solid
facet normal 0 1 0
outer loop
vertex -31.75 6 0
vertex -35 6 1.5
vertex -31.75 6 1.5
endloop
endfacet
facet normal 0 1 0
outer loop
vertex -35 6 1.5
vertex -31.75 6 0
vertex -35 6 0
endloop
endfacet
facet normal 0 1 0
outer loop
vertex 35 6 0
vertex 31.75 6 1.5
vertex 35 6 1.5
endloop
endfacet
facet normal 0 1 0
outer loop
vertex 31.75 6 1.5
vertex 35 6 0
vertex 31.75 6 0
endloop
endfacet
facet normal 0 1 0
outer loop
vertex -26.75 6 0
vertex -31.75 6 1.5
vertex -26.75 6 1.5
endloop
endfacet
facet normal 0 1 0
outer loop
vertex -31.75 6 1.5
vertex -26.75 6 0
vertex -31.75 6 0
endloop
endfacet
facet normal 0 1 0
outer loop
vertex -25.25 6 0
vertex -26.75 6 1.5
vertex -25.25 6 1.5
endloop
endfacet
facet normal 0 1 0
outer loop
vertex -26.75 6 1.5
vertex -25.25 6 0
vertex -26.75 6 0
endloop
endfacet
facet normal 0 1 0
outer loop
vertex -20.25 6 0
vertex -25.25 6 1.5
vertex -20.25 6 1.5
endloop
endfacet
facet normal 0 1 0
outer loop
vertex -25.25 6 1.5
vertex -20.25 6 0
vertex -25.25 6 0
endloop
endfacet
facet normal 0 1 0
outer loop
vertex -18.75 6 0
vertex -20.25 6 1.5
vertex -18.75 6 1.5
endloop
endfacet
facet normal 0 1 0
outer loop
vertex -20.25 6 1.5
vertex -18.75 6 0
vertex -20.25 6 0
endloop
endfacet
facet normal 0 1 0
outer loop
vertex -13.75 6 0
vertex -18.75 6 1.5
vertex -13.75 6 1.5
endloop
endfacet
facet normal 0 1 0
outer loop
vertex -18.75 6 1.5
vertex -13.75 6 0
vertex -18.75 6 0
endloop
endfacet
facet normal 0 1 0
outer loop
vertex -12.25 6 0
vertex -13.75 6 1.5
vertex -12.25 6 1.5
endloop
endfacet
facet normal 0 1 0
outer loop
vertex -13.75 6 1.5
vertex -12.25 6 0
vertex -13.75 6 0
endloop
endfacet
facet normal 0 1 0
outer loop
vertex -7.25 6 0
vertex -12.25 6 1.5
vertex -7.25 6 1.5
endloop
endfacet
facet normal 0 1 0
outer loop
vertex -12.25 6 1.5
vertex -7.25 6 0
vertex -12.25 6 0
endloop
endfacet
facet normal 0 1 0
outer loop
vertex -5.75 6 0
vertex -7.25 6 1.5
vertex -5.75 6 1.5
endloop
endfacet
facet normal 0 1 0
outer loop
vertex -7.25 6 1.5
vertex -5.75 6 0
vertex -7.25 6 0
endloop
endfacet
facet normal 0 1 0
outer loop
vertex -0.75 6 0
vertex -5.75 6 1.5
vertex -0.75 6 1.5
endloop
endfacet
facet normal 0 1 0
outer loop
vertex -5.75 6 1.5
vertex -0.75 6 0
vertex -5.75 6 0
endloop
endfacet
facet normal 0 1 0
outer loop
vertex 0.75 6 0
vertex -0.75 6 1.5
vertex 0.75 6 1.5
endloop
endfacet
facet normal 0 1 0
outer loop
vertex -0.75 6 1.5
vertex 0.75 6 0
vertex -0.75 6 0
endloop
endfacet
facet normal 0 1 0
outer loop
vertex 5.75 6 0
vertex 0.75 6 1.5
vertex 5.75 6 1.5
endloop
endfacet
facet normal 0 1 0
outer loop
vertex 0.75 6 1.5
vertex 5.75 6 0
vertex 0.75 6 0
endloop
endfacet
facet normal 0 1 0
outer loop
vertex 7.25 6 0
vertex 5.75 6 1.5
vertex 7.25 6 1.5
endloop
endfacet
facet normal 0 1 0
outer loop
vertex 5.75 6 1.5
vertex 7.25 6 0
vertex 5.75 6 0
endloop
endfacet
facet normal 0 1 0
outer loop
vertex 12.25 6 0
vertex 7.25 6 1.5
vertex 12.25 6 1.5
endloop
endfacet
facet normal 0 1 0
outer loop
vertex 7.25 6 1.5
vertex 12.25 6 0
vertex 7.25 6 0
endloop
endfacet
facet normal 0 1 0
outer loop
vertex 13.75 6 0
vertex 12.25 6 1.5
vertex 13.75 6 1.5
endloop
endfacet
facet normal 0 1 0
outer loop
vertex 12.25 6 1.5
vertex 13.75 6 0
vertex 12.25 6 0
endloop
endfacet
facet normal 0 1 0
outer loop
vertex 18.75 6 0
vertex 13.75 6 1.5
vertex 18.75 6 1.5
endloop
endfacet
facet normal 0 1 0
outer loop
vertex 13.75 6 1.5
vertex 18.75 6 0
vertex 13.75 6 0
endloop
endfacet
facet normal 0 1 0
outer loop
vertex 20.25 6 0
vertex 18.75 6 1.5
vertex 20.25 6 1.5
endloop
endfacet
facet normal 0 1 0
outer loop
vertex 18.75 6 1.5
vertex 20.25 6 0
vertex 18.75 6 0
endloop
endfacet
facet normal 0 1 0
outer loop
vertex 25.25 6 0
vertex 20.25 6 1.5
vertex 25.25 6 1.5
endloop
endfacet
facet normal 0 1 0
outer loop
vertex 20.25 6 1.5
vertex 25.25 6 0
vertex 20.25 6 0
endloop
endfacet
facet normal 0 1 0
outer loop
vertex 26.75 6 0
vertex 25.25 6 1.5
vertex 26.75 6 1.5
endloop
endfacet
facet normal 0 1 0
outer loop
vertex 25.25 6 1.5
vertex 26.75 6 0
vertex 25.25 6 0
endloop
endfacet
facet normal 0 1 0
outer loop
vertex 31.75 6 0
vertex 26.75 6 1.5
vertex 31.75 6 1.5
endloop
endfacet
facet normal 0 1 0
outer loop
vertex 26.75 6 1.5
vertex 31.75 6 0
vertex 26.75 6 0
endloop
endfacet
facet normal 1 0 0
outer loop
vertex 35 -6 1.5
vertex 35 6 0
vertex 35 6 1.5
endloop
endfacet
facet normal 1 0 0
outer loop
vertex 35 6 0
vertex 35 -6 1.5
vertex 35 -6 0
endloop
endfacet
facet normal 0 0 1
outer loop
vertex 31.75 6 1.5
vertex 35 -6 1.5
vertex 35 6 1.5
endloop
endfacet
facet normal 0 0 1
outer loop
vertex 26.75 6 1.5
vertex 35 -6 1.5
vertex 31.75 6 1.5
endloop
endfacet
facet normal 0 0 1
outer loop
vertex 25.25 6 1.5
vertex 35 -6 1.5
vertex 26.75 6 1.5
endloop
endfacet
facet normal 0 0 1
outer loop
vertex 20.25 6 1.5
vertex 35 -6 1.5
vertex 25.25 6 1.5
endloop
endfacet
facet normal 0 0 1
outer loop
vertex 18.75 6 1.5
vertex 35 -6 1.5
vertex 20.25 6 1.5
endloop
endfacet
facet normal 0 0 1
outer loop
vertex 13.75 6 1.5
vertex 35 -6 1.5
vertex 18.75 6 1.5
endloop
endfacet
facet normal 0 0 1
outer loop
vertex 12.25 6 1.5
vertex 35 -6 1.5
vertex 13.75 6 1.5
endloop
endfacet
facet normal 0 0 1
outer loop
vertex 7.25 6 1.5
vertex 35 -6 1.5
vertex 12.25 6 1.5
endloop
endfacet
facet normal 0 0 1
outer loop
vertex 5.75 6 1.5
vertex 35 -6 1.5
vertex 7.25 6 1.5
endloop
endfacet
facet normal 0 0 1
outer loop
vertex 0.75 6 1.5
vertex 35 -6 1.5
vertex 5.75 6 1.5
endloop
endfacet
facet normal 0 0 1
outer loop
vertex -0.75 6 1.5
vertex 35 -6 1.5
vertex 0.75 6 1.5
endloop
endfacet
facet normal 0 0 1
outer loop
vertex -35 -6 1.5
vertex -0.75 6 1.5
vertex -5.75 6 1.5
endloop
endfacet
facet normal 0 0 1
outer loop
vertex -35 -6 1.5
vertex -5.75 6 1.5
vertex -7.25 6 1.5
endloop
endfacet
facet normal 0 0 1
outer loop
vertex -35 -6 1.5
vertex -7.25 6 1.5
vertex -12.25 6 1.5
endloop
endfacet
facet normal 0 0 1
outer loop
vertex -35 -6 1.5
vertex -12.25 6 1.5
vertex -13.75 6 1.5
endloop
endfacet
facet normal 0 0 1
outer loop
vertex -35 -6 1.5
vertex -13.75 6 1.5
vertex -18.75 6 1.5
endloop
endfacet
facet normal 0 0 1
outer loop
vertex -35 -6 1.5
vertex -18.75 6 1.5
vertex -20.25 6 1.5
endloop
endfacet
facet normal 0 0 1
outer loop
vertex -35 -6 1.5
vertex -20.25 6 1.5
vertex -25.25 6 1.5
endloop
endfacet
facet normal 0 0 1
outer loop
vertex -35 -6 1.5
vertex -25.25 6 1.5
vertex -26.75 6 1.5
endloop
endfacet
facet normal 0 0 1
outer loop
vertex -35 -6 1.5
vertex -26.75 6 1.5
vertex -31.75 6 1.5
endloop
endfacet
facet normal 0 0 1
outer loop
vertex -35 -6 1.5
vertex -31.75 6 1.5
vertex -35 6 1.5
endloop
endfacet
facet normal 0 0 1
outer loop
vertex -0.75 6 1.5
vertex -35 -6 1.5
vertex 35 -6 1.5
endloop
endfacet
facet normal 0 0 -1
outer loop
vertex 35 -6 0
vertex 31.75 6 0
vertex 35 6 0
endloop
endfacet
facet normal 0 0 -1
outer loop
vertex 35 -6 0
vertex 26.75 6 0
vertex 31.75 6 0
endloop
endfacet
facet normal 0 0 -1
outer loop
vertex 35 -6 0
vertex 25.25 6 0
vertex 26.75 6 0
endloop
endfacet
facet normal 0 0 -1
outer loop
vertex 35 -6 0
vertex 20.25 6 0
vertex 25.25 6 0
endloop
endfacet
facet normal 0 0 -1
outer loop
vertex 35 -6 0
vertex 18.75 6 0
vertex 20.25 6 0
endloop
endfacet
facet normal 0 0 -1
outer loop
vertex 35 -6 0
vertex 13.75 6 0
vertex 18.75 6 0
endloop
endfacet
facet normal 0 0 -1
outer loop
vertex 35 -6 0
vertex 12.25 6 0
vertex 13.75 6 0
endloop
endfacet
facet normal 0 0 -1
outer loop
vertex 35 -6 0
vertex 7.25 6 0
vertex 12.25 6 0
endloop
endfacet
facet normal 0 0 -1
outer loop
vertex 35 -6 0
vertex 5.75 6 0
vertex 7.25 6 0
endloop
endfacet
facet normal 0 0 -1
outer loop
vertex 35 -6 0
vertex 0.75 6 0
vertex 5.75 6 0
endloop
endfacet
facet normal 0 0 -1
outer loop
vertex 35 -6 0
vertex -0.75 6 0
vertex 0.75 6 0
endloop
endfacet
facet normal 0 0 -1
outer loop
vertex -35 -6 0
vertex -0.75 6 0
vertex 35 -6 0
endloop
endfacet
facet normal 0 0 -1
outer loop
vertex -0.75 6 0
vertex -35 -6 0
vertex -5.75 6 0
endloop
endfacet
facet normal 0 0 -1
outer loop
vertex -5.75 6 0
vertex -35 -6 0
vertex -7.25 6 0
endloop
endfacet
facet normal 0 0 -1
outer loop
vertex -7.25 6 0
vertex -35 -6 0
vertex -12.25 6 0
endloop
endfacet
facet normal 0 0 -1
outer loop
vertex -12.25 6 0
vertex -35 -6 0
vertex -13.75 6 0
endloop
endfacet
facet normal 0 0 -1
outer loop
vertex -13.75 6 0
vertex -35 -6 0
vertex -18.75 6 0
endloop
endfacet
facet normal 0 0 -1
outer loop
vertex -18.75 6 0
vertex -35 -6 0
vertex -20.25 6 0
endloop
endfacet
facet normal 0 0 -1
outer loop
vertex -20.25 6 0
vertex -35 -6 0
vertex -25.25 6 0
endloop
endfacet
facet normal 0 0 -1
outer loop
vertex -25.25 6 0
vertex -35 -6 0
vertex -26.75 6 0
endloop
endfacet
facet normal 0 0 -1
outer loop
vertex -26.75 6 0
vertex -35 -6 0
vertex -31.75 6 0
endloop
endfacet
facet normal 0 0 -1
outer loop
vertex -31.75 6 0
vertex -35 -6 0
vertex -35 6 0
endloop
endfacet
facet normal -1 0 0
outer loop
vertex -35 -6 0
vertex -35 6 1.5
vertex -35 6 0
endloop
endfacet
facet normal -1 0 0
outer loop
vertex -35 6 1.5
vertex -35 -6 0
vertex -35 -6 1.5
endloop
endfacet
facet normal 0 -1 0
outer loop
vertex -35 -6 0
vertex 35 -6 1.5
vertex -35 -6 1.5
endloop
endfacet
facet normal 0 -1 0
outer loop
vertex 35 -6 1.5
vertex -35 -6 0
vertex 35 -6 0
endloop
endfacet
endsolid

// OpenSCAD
// 10-well comb for agarose gel casting
// Print orientation: flat on bed, teeth pointing down (-Z)

// ---------- Parameters ----------
plate_len    = 70;    // spine length (X)
plate_wid    = 12;    // spine width (Y)
plate_thk    = 1.5;   // plate thickness (Z)

tooth_count  = 10;    // number of wells
tooth_w      = 5.0;   // tooth width (X)
tooth_len    = 12;    // tooth length (Y)
tooth_h      = 3;     // tooth height from top face (Z)
tooth_pitch  = 1.5;   // gap between neighbouring teeth (X)

eps          = 0.5;   // overcut for clean differences

$fn = 64;

// ---------- Model ----------
difference() {
    // Base plate
    translate([-plate_len/2, -plate_wid/2, 0])
        cube([plate_len, plate_wid, plate_thk]);

    // Teeth, centred on the plate in X
    for (i = [0 : tooth_count - 1]) {
        x = (i - (tooth_count - 1)/2) * (tooth_w + tooth_pitch);
        translate([x - tooth_w/2, -plate_wid/2 + tooth_len,
                   plate_thk - tooth_h])
            cube([tooth_w, tooth_len, tooth_h + eps]);
    }
}
